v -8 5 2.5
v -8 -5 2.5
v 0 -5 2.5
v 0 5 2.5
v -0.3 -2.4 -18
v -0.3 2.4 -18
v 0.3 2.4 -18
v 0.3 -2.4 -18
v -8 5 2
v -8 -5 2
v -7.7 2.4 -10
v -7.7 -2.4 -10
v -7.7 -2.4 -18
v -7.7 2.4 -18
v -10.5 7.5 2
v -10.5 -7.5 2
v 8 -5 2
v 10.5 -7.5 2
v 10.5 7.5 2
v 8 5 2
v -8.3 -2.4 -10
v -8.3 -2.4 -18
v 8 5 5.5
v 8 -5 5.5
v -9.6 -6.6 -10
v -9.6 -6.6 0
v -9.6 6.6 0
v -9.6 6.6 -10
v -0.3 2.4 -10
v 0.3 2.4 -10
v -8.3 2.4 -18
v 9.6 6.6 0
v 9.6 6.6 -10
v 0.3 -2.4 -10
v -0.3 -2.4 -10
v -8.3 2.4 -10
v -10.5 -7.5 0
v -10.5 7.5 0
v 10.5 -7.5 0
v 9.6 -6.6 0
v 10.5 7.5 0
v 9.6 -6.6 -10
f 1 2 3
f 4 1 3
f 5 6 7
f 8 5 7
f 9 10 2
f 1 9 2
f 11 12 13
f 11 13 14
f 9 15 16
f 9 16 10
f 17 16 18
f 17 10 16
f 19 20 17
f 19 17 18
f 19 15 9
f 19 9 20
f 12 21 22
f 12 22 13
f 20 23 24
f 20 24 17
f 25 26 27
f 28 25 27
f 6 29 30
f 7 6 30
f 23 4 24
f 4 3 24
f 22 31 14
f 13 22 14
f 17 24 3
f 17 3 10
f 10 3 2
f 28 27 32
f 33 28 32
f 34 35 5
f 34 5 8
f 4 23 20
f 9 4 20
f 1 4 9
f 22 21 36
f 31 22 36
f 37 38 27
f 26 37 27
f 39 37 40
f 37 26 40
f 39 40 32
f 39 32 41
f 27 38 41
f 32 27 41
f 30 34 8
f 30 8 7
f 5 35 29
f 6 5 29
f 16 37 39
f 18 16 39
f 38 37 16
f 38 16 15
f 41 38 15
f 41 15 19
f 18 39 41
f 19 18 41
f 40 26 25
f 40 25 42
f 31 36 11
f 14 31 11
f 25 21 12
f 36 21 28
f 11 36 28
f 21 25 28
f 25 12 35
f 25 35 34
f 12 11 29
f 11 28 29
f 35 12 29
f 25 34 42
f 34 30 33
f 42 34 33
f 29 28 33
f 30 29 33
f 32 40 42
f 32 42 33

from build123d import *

# Parameters (mm, degrees)
SKETCH079_W  = 21
SKETCH079_H  = 15
PAD044_DEPTH = 2
SKETCH080_W  = 19.2
SKETCH080_H  = 13.2
PAD045_DEPTH = 10
SKETCH081_W  = 0.6
SKETCH081_H  = 4.8
PAD046_DEPTH = 8
PAD047_DEPTH = 5


with BuildPart() as part:
    # Sketch079 → Pad044 (new body)
    with BuildSketch(Plane.XY):
        Rectangle(SKETCH079_W, SKETCH079_H)
    extrude(amount=PAD044_DEPTH)

    # Sketch080 → Pad045 (join)
    with BuildSketch(Plane.XY):
        Rectangle(SKETCH080_W, SKETCH080_H)
    extrude(amount=-PAD045_DEPTH)

    # Sketch081 → Pad046 (join)
    with BuildSketch(Plane.XY.offset(-10)):
        Rectangle(SKETCH081_W, SKETCH081_H)
        with Locations((-8, 0)):
            Rectangle(SKETCH081_W, SKETCH081_H)
    extrude(amount=-PAD046_DEPTH)

    # Sketch082 → Pad047 (join, symmetric)
    with BuildSketch(Plane(origin=(0, 0, 2.5), x_dir=(1, 0, 0), z_dir=(0, -1, 0))):
        Polygon((-8, 0), (0, 0), (8, 3), (8, -1), (-8, -1), align=None)
    extrude(amount=PAD047_DEPTH, both=True)


solid = part.part
